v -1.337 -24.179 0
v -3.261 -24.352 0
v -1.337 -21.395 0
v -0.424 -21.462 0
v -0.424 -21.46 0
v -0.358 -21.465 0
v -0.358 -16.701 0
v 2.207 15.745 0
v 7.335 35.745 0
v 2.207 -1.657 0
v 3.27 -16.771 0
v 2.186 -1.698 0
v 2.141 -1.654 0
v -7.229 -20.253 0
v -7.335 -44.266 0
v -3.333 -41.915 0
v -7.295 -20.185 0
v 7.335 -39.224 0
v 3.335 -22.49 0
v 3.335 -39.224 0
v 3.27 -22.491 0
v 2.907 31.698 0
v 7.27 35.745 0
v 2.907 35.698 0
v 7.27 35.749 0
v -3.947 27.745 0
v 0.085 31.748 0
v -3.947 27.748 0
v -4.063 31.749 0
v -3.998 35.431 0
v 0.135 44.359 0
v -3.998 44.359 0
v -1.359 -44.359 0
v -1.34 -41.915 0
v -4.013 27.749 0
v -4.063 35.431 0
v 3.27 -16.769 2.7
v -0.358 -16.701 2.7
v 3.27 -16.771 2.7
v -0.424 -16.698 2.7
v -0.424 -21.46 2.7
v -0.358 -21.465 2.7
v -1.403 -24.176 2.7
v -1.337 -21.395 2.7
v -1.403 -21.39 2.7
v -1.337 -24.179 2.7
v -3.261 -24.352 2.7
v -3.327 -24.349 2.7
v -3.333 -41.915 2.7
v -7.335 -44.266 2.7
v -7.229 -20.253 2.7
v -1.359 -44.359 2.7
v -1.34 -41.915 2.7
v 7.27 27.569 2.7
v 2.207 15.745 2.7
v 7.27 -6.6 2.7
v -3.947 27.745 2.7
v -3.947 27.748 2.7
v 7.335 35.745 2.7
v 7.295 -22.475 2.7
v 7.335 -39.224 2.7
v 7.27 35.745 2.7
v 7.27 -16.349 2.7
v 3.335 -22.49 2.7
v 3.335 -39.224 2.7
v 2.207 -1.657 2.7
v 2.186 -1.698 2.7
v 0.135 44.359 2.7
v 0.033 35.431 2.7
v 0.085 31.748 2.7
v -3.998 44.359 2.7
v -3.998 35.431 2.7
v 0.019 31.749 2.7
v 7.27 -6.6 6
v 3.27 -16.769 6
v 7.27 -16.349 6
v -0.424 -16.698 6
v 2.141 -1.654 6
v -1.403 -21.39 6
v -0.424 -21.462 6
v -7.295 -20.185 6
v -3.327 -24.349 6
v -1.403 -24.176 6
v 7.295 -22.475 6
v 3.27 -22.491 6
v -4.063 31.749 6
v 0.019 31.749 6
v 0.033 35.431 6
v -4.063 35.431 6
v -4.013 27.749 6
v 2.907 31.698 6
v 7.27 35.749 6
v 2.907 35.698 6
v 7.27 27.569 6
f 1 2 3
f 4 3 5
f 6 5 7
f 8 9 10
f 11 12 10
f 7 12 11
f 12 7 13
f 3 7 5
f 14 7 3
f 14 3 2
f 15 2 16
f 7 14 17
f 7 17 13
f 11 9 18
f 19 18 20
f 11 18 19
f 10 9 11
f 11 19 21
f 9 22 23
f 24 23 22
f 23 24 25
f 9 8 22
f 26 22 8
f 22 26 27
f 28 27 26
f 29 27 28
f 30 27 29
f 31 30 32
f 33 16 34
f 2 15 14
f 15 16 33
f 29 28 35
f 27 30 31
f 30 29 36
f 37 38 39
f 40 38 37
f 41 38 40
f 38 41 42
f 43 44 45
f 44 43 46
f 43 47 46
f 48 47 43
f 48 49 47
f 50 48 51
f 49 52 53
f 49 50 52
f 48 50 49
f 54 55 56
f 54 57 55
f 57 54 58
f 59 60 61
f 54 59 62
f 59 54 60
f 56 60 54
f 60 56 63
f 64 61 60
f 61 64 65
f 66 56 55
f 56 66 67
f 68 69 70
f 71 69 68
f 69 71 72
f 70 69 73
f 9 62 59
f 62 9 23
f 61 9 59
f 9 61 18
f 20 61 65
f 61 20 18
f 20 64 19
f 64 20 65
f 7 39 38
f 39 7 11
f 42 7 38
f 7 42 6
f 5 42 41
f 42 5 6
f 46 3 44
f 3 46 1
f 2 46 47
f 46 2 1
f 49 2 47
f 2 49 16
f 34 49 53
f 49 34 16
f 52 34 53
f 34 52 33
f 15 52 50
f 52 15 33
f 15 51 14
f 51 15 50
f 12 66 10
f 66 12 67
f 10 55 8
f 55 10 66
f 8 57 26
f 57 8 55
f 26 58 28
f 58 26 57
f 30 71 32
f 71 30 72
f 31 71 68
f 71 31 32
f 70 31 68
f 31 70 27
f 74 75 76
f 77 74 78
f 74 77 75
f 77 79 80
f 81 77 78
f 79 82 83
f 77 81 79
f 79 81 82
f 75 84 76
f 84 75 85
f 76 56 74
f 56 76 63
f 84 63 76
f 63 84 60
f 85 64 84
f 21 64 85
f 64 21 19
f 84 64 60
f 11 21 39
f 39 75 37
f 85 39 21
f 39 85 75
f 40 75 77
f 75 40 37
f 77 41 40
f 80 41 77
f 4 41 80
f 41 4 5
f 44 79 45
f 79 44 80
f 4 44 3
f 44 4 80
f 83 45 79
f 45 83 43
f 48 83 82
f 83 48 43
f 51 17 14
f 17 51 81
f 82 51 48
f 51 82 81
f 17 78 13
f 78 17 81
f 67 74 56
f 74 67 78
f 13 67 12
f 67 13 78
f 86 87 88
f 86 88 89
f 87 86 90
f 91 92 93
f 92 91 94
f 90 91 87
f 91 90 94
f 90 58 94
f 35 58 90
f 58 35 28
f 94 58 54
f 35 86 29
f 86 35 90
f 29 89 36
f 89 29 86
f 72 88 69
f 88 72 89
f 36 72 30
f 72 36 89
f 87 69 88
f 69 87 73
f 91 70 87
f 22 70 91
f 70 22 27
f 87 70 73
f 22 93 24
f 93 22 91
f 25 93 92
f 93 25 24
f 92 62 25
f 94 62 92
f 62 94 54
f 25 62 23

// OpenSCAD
// file: filter_tri_stand_60.scad
// Generated by inkscape 0.91 r13725 + inkscape-paths2openscad 0.25
// Tue May 19 15:11:32 2020 from "filter_tri_stand.svg"

// Module names are of the form poly_<inkscape-path-id>().  As a result,
// you can associate a polygon in this OpenSCAD program with the corresponding
// SVG element in the Inkscape document by looking for the XML element with
// the attribute id="inkscape-path-id".

// fudge value is used to ensure that subtracted solids are a tad taller
// in the z dimension than the polygon being subtracted from.  This helps
// keep the resulting .stl file manifold.
fudge = 0.1;
zsize = 6;
line_fn = 4;
min_line_width = 1.0;
line_width_scale = 1.0;
function min_line_mm(w) = max(min_line_width, w * line_width_scale) * 90/25.4;


path41383_0_center = [0.000000,66.264640];
path41383_0_points = [[25.758507,43.582490],[25.758507,78.126000],[25.847797,99.832490],[11.585281,99.888490],[11.585281,79.615220],[-1.501329,79.362680],[-1.501329,96.242130],[-4.970889,95.989590],[-4.970889,105.858880],[-11.789419,106.472420],[-25.847797,91.716780],[7.585274,26.056860],[25.758507,43.582490]];
module poly_path41383(h, w, s, res=line_fn)
{
  scale([25.4/90, -25.4/90, 1]) union()
  {
    translate (path41383_0_center) linear_extrude(height=h, convexity=10, scale=0.01*s)
      translate (-path41383_0_center) polygon(path41383_0_points);
  }
}

path41386_0_center = [5.680330,-91.980675];
path41386_0_points = [[25.758507,-92.299190],[25.758507,-77.488930],[-14.219277,-78.125960],[-14.397847,-92.299190],[-14.397847,-105.346080],[0.118562,-105.345840],[0.066432,-92.299190],[10.299558,-92.120620],[10.299558,-106.293850],[25.758502,-106.472420],[25.758507,-92.299190]];
module poly_path41386(h, w, s, res=line_fn)
{
  scale([25.4/90, -25.4/90, 1]) union()
  {
    translate (path41386_0_center) linear_extrude(height=h, convexity=10, scale=0.01*s)
      translate (-path41386_0_center) polygon(path41386_0_points);
  }
}

module filter_tri_stand_60(h)
{
  difference()
  {
    union()
    {
      translate ([0,0,0]) poly_path41383(h, min_line_mm(0.282222222222), 100.0);
      translate ([0,0,0]) poly_path41386(h, min_line_mm(0.282222222222), 100.0);
    }
    union()
    {
    }
  }
}

filter_tri_stand_60(zsize);
// file: filter_tri_stand_27.scad
// Generated by inkscape 0.91 r13725 + inkscape-paths2openscad 0.25
// Tue May 19 15:11:55 2020 from "filter_tri_stand.svg"

// Module names are of the form poly_<inkscape-path-id>().  As a result,
// you can associate a polygon in this OpenSCAD program with the corresponding
// SVG element in the Inkscape document by looking for the XML element with
// the attribute id="inkscape-path-id".

// fudge value is used to ensure that subtracted solids are a tad taller
// in the z dimension than the polygon being subtracted from.  This helps
// keep the resulting .stl file manifold.
fudge = 0.1;
zsize = 2.7000000476837158;
line_fn = 4;
min_line_width = 1.0;
line_width_scale = 1.0;
function min_line_mm(w) = max(min_line_width, w * line_width_scale) * 90/25.4;


path4138_0_center = [0.000000,0.000000];
path4138_0_points = [[25.991602,-112.483390],[25.991602,57.941800],[25.991602,138.981100],[11.818372,138.981100],[11.818372,72.115030],[11.818372,59.431050],[-1.268238,59.178510],[-1.268238,76.057960],[-4.737798,75.805420],[-4.737798,85.674710],[-11.556328,86.288250],[-11.808858,148.516100],[-4.747715,148.516100],[-4.814125,157.176300],[-25.991602,156.849800],[-25.614702,71.532580],[7.818369,5.872660],[7.818369,-55.790490],[-13.986182,-98.310160],[-14.164752,-112.483390],[-14.164752,-157.176300],[0.478099,-157.176300],[0.299529,-112.483390],[10.532655,-112.304820],[10.532655,-126.478050],[25.991599,-126.656620],[25.991602,-112.483390]];
module poly_path4138(h, w, s, res=line_fn)
{
  scale([25.4/90, -25.4/90, 1]) union()
  {
    translate (path4138_0_center) linear_extrude(height=h, convexity=10, scale=0.01*s)
      translate (-path4138_0_center) polygon(path4138_0_points);
  }
}

module filter_tri_stand_27(h)
{
  difference()
  {
    union()
    {
      translate ([0,0,0]) poly_path4138(h, min_line_mm(0.282222222222), 100.0);
    }
    union()
    {
    }
  }
}

filter_tri_stand_27(zsize);
// main file
module wat(){
    include<filter_tri_stand_27.scad>;
}
module wtf(){
    include<filter_tri_stand_60.scad>;
}

wat();
color("blue") translate([0,5.7,0]) wtf();
